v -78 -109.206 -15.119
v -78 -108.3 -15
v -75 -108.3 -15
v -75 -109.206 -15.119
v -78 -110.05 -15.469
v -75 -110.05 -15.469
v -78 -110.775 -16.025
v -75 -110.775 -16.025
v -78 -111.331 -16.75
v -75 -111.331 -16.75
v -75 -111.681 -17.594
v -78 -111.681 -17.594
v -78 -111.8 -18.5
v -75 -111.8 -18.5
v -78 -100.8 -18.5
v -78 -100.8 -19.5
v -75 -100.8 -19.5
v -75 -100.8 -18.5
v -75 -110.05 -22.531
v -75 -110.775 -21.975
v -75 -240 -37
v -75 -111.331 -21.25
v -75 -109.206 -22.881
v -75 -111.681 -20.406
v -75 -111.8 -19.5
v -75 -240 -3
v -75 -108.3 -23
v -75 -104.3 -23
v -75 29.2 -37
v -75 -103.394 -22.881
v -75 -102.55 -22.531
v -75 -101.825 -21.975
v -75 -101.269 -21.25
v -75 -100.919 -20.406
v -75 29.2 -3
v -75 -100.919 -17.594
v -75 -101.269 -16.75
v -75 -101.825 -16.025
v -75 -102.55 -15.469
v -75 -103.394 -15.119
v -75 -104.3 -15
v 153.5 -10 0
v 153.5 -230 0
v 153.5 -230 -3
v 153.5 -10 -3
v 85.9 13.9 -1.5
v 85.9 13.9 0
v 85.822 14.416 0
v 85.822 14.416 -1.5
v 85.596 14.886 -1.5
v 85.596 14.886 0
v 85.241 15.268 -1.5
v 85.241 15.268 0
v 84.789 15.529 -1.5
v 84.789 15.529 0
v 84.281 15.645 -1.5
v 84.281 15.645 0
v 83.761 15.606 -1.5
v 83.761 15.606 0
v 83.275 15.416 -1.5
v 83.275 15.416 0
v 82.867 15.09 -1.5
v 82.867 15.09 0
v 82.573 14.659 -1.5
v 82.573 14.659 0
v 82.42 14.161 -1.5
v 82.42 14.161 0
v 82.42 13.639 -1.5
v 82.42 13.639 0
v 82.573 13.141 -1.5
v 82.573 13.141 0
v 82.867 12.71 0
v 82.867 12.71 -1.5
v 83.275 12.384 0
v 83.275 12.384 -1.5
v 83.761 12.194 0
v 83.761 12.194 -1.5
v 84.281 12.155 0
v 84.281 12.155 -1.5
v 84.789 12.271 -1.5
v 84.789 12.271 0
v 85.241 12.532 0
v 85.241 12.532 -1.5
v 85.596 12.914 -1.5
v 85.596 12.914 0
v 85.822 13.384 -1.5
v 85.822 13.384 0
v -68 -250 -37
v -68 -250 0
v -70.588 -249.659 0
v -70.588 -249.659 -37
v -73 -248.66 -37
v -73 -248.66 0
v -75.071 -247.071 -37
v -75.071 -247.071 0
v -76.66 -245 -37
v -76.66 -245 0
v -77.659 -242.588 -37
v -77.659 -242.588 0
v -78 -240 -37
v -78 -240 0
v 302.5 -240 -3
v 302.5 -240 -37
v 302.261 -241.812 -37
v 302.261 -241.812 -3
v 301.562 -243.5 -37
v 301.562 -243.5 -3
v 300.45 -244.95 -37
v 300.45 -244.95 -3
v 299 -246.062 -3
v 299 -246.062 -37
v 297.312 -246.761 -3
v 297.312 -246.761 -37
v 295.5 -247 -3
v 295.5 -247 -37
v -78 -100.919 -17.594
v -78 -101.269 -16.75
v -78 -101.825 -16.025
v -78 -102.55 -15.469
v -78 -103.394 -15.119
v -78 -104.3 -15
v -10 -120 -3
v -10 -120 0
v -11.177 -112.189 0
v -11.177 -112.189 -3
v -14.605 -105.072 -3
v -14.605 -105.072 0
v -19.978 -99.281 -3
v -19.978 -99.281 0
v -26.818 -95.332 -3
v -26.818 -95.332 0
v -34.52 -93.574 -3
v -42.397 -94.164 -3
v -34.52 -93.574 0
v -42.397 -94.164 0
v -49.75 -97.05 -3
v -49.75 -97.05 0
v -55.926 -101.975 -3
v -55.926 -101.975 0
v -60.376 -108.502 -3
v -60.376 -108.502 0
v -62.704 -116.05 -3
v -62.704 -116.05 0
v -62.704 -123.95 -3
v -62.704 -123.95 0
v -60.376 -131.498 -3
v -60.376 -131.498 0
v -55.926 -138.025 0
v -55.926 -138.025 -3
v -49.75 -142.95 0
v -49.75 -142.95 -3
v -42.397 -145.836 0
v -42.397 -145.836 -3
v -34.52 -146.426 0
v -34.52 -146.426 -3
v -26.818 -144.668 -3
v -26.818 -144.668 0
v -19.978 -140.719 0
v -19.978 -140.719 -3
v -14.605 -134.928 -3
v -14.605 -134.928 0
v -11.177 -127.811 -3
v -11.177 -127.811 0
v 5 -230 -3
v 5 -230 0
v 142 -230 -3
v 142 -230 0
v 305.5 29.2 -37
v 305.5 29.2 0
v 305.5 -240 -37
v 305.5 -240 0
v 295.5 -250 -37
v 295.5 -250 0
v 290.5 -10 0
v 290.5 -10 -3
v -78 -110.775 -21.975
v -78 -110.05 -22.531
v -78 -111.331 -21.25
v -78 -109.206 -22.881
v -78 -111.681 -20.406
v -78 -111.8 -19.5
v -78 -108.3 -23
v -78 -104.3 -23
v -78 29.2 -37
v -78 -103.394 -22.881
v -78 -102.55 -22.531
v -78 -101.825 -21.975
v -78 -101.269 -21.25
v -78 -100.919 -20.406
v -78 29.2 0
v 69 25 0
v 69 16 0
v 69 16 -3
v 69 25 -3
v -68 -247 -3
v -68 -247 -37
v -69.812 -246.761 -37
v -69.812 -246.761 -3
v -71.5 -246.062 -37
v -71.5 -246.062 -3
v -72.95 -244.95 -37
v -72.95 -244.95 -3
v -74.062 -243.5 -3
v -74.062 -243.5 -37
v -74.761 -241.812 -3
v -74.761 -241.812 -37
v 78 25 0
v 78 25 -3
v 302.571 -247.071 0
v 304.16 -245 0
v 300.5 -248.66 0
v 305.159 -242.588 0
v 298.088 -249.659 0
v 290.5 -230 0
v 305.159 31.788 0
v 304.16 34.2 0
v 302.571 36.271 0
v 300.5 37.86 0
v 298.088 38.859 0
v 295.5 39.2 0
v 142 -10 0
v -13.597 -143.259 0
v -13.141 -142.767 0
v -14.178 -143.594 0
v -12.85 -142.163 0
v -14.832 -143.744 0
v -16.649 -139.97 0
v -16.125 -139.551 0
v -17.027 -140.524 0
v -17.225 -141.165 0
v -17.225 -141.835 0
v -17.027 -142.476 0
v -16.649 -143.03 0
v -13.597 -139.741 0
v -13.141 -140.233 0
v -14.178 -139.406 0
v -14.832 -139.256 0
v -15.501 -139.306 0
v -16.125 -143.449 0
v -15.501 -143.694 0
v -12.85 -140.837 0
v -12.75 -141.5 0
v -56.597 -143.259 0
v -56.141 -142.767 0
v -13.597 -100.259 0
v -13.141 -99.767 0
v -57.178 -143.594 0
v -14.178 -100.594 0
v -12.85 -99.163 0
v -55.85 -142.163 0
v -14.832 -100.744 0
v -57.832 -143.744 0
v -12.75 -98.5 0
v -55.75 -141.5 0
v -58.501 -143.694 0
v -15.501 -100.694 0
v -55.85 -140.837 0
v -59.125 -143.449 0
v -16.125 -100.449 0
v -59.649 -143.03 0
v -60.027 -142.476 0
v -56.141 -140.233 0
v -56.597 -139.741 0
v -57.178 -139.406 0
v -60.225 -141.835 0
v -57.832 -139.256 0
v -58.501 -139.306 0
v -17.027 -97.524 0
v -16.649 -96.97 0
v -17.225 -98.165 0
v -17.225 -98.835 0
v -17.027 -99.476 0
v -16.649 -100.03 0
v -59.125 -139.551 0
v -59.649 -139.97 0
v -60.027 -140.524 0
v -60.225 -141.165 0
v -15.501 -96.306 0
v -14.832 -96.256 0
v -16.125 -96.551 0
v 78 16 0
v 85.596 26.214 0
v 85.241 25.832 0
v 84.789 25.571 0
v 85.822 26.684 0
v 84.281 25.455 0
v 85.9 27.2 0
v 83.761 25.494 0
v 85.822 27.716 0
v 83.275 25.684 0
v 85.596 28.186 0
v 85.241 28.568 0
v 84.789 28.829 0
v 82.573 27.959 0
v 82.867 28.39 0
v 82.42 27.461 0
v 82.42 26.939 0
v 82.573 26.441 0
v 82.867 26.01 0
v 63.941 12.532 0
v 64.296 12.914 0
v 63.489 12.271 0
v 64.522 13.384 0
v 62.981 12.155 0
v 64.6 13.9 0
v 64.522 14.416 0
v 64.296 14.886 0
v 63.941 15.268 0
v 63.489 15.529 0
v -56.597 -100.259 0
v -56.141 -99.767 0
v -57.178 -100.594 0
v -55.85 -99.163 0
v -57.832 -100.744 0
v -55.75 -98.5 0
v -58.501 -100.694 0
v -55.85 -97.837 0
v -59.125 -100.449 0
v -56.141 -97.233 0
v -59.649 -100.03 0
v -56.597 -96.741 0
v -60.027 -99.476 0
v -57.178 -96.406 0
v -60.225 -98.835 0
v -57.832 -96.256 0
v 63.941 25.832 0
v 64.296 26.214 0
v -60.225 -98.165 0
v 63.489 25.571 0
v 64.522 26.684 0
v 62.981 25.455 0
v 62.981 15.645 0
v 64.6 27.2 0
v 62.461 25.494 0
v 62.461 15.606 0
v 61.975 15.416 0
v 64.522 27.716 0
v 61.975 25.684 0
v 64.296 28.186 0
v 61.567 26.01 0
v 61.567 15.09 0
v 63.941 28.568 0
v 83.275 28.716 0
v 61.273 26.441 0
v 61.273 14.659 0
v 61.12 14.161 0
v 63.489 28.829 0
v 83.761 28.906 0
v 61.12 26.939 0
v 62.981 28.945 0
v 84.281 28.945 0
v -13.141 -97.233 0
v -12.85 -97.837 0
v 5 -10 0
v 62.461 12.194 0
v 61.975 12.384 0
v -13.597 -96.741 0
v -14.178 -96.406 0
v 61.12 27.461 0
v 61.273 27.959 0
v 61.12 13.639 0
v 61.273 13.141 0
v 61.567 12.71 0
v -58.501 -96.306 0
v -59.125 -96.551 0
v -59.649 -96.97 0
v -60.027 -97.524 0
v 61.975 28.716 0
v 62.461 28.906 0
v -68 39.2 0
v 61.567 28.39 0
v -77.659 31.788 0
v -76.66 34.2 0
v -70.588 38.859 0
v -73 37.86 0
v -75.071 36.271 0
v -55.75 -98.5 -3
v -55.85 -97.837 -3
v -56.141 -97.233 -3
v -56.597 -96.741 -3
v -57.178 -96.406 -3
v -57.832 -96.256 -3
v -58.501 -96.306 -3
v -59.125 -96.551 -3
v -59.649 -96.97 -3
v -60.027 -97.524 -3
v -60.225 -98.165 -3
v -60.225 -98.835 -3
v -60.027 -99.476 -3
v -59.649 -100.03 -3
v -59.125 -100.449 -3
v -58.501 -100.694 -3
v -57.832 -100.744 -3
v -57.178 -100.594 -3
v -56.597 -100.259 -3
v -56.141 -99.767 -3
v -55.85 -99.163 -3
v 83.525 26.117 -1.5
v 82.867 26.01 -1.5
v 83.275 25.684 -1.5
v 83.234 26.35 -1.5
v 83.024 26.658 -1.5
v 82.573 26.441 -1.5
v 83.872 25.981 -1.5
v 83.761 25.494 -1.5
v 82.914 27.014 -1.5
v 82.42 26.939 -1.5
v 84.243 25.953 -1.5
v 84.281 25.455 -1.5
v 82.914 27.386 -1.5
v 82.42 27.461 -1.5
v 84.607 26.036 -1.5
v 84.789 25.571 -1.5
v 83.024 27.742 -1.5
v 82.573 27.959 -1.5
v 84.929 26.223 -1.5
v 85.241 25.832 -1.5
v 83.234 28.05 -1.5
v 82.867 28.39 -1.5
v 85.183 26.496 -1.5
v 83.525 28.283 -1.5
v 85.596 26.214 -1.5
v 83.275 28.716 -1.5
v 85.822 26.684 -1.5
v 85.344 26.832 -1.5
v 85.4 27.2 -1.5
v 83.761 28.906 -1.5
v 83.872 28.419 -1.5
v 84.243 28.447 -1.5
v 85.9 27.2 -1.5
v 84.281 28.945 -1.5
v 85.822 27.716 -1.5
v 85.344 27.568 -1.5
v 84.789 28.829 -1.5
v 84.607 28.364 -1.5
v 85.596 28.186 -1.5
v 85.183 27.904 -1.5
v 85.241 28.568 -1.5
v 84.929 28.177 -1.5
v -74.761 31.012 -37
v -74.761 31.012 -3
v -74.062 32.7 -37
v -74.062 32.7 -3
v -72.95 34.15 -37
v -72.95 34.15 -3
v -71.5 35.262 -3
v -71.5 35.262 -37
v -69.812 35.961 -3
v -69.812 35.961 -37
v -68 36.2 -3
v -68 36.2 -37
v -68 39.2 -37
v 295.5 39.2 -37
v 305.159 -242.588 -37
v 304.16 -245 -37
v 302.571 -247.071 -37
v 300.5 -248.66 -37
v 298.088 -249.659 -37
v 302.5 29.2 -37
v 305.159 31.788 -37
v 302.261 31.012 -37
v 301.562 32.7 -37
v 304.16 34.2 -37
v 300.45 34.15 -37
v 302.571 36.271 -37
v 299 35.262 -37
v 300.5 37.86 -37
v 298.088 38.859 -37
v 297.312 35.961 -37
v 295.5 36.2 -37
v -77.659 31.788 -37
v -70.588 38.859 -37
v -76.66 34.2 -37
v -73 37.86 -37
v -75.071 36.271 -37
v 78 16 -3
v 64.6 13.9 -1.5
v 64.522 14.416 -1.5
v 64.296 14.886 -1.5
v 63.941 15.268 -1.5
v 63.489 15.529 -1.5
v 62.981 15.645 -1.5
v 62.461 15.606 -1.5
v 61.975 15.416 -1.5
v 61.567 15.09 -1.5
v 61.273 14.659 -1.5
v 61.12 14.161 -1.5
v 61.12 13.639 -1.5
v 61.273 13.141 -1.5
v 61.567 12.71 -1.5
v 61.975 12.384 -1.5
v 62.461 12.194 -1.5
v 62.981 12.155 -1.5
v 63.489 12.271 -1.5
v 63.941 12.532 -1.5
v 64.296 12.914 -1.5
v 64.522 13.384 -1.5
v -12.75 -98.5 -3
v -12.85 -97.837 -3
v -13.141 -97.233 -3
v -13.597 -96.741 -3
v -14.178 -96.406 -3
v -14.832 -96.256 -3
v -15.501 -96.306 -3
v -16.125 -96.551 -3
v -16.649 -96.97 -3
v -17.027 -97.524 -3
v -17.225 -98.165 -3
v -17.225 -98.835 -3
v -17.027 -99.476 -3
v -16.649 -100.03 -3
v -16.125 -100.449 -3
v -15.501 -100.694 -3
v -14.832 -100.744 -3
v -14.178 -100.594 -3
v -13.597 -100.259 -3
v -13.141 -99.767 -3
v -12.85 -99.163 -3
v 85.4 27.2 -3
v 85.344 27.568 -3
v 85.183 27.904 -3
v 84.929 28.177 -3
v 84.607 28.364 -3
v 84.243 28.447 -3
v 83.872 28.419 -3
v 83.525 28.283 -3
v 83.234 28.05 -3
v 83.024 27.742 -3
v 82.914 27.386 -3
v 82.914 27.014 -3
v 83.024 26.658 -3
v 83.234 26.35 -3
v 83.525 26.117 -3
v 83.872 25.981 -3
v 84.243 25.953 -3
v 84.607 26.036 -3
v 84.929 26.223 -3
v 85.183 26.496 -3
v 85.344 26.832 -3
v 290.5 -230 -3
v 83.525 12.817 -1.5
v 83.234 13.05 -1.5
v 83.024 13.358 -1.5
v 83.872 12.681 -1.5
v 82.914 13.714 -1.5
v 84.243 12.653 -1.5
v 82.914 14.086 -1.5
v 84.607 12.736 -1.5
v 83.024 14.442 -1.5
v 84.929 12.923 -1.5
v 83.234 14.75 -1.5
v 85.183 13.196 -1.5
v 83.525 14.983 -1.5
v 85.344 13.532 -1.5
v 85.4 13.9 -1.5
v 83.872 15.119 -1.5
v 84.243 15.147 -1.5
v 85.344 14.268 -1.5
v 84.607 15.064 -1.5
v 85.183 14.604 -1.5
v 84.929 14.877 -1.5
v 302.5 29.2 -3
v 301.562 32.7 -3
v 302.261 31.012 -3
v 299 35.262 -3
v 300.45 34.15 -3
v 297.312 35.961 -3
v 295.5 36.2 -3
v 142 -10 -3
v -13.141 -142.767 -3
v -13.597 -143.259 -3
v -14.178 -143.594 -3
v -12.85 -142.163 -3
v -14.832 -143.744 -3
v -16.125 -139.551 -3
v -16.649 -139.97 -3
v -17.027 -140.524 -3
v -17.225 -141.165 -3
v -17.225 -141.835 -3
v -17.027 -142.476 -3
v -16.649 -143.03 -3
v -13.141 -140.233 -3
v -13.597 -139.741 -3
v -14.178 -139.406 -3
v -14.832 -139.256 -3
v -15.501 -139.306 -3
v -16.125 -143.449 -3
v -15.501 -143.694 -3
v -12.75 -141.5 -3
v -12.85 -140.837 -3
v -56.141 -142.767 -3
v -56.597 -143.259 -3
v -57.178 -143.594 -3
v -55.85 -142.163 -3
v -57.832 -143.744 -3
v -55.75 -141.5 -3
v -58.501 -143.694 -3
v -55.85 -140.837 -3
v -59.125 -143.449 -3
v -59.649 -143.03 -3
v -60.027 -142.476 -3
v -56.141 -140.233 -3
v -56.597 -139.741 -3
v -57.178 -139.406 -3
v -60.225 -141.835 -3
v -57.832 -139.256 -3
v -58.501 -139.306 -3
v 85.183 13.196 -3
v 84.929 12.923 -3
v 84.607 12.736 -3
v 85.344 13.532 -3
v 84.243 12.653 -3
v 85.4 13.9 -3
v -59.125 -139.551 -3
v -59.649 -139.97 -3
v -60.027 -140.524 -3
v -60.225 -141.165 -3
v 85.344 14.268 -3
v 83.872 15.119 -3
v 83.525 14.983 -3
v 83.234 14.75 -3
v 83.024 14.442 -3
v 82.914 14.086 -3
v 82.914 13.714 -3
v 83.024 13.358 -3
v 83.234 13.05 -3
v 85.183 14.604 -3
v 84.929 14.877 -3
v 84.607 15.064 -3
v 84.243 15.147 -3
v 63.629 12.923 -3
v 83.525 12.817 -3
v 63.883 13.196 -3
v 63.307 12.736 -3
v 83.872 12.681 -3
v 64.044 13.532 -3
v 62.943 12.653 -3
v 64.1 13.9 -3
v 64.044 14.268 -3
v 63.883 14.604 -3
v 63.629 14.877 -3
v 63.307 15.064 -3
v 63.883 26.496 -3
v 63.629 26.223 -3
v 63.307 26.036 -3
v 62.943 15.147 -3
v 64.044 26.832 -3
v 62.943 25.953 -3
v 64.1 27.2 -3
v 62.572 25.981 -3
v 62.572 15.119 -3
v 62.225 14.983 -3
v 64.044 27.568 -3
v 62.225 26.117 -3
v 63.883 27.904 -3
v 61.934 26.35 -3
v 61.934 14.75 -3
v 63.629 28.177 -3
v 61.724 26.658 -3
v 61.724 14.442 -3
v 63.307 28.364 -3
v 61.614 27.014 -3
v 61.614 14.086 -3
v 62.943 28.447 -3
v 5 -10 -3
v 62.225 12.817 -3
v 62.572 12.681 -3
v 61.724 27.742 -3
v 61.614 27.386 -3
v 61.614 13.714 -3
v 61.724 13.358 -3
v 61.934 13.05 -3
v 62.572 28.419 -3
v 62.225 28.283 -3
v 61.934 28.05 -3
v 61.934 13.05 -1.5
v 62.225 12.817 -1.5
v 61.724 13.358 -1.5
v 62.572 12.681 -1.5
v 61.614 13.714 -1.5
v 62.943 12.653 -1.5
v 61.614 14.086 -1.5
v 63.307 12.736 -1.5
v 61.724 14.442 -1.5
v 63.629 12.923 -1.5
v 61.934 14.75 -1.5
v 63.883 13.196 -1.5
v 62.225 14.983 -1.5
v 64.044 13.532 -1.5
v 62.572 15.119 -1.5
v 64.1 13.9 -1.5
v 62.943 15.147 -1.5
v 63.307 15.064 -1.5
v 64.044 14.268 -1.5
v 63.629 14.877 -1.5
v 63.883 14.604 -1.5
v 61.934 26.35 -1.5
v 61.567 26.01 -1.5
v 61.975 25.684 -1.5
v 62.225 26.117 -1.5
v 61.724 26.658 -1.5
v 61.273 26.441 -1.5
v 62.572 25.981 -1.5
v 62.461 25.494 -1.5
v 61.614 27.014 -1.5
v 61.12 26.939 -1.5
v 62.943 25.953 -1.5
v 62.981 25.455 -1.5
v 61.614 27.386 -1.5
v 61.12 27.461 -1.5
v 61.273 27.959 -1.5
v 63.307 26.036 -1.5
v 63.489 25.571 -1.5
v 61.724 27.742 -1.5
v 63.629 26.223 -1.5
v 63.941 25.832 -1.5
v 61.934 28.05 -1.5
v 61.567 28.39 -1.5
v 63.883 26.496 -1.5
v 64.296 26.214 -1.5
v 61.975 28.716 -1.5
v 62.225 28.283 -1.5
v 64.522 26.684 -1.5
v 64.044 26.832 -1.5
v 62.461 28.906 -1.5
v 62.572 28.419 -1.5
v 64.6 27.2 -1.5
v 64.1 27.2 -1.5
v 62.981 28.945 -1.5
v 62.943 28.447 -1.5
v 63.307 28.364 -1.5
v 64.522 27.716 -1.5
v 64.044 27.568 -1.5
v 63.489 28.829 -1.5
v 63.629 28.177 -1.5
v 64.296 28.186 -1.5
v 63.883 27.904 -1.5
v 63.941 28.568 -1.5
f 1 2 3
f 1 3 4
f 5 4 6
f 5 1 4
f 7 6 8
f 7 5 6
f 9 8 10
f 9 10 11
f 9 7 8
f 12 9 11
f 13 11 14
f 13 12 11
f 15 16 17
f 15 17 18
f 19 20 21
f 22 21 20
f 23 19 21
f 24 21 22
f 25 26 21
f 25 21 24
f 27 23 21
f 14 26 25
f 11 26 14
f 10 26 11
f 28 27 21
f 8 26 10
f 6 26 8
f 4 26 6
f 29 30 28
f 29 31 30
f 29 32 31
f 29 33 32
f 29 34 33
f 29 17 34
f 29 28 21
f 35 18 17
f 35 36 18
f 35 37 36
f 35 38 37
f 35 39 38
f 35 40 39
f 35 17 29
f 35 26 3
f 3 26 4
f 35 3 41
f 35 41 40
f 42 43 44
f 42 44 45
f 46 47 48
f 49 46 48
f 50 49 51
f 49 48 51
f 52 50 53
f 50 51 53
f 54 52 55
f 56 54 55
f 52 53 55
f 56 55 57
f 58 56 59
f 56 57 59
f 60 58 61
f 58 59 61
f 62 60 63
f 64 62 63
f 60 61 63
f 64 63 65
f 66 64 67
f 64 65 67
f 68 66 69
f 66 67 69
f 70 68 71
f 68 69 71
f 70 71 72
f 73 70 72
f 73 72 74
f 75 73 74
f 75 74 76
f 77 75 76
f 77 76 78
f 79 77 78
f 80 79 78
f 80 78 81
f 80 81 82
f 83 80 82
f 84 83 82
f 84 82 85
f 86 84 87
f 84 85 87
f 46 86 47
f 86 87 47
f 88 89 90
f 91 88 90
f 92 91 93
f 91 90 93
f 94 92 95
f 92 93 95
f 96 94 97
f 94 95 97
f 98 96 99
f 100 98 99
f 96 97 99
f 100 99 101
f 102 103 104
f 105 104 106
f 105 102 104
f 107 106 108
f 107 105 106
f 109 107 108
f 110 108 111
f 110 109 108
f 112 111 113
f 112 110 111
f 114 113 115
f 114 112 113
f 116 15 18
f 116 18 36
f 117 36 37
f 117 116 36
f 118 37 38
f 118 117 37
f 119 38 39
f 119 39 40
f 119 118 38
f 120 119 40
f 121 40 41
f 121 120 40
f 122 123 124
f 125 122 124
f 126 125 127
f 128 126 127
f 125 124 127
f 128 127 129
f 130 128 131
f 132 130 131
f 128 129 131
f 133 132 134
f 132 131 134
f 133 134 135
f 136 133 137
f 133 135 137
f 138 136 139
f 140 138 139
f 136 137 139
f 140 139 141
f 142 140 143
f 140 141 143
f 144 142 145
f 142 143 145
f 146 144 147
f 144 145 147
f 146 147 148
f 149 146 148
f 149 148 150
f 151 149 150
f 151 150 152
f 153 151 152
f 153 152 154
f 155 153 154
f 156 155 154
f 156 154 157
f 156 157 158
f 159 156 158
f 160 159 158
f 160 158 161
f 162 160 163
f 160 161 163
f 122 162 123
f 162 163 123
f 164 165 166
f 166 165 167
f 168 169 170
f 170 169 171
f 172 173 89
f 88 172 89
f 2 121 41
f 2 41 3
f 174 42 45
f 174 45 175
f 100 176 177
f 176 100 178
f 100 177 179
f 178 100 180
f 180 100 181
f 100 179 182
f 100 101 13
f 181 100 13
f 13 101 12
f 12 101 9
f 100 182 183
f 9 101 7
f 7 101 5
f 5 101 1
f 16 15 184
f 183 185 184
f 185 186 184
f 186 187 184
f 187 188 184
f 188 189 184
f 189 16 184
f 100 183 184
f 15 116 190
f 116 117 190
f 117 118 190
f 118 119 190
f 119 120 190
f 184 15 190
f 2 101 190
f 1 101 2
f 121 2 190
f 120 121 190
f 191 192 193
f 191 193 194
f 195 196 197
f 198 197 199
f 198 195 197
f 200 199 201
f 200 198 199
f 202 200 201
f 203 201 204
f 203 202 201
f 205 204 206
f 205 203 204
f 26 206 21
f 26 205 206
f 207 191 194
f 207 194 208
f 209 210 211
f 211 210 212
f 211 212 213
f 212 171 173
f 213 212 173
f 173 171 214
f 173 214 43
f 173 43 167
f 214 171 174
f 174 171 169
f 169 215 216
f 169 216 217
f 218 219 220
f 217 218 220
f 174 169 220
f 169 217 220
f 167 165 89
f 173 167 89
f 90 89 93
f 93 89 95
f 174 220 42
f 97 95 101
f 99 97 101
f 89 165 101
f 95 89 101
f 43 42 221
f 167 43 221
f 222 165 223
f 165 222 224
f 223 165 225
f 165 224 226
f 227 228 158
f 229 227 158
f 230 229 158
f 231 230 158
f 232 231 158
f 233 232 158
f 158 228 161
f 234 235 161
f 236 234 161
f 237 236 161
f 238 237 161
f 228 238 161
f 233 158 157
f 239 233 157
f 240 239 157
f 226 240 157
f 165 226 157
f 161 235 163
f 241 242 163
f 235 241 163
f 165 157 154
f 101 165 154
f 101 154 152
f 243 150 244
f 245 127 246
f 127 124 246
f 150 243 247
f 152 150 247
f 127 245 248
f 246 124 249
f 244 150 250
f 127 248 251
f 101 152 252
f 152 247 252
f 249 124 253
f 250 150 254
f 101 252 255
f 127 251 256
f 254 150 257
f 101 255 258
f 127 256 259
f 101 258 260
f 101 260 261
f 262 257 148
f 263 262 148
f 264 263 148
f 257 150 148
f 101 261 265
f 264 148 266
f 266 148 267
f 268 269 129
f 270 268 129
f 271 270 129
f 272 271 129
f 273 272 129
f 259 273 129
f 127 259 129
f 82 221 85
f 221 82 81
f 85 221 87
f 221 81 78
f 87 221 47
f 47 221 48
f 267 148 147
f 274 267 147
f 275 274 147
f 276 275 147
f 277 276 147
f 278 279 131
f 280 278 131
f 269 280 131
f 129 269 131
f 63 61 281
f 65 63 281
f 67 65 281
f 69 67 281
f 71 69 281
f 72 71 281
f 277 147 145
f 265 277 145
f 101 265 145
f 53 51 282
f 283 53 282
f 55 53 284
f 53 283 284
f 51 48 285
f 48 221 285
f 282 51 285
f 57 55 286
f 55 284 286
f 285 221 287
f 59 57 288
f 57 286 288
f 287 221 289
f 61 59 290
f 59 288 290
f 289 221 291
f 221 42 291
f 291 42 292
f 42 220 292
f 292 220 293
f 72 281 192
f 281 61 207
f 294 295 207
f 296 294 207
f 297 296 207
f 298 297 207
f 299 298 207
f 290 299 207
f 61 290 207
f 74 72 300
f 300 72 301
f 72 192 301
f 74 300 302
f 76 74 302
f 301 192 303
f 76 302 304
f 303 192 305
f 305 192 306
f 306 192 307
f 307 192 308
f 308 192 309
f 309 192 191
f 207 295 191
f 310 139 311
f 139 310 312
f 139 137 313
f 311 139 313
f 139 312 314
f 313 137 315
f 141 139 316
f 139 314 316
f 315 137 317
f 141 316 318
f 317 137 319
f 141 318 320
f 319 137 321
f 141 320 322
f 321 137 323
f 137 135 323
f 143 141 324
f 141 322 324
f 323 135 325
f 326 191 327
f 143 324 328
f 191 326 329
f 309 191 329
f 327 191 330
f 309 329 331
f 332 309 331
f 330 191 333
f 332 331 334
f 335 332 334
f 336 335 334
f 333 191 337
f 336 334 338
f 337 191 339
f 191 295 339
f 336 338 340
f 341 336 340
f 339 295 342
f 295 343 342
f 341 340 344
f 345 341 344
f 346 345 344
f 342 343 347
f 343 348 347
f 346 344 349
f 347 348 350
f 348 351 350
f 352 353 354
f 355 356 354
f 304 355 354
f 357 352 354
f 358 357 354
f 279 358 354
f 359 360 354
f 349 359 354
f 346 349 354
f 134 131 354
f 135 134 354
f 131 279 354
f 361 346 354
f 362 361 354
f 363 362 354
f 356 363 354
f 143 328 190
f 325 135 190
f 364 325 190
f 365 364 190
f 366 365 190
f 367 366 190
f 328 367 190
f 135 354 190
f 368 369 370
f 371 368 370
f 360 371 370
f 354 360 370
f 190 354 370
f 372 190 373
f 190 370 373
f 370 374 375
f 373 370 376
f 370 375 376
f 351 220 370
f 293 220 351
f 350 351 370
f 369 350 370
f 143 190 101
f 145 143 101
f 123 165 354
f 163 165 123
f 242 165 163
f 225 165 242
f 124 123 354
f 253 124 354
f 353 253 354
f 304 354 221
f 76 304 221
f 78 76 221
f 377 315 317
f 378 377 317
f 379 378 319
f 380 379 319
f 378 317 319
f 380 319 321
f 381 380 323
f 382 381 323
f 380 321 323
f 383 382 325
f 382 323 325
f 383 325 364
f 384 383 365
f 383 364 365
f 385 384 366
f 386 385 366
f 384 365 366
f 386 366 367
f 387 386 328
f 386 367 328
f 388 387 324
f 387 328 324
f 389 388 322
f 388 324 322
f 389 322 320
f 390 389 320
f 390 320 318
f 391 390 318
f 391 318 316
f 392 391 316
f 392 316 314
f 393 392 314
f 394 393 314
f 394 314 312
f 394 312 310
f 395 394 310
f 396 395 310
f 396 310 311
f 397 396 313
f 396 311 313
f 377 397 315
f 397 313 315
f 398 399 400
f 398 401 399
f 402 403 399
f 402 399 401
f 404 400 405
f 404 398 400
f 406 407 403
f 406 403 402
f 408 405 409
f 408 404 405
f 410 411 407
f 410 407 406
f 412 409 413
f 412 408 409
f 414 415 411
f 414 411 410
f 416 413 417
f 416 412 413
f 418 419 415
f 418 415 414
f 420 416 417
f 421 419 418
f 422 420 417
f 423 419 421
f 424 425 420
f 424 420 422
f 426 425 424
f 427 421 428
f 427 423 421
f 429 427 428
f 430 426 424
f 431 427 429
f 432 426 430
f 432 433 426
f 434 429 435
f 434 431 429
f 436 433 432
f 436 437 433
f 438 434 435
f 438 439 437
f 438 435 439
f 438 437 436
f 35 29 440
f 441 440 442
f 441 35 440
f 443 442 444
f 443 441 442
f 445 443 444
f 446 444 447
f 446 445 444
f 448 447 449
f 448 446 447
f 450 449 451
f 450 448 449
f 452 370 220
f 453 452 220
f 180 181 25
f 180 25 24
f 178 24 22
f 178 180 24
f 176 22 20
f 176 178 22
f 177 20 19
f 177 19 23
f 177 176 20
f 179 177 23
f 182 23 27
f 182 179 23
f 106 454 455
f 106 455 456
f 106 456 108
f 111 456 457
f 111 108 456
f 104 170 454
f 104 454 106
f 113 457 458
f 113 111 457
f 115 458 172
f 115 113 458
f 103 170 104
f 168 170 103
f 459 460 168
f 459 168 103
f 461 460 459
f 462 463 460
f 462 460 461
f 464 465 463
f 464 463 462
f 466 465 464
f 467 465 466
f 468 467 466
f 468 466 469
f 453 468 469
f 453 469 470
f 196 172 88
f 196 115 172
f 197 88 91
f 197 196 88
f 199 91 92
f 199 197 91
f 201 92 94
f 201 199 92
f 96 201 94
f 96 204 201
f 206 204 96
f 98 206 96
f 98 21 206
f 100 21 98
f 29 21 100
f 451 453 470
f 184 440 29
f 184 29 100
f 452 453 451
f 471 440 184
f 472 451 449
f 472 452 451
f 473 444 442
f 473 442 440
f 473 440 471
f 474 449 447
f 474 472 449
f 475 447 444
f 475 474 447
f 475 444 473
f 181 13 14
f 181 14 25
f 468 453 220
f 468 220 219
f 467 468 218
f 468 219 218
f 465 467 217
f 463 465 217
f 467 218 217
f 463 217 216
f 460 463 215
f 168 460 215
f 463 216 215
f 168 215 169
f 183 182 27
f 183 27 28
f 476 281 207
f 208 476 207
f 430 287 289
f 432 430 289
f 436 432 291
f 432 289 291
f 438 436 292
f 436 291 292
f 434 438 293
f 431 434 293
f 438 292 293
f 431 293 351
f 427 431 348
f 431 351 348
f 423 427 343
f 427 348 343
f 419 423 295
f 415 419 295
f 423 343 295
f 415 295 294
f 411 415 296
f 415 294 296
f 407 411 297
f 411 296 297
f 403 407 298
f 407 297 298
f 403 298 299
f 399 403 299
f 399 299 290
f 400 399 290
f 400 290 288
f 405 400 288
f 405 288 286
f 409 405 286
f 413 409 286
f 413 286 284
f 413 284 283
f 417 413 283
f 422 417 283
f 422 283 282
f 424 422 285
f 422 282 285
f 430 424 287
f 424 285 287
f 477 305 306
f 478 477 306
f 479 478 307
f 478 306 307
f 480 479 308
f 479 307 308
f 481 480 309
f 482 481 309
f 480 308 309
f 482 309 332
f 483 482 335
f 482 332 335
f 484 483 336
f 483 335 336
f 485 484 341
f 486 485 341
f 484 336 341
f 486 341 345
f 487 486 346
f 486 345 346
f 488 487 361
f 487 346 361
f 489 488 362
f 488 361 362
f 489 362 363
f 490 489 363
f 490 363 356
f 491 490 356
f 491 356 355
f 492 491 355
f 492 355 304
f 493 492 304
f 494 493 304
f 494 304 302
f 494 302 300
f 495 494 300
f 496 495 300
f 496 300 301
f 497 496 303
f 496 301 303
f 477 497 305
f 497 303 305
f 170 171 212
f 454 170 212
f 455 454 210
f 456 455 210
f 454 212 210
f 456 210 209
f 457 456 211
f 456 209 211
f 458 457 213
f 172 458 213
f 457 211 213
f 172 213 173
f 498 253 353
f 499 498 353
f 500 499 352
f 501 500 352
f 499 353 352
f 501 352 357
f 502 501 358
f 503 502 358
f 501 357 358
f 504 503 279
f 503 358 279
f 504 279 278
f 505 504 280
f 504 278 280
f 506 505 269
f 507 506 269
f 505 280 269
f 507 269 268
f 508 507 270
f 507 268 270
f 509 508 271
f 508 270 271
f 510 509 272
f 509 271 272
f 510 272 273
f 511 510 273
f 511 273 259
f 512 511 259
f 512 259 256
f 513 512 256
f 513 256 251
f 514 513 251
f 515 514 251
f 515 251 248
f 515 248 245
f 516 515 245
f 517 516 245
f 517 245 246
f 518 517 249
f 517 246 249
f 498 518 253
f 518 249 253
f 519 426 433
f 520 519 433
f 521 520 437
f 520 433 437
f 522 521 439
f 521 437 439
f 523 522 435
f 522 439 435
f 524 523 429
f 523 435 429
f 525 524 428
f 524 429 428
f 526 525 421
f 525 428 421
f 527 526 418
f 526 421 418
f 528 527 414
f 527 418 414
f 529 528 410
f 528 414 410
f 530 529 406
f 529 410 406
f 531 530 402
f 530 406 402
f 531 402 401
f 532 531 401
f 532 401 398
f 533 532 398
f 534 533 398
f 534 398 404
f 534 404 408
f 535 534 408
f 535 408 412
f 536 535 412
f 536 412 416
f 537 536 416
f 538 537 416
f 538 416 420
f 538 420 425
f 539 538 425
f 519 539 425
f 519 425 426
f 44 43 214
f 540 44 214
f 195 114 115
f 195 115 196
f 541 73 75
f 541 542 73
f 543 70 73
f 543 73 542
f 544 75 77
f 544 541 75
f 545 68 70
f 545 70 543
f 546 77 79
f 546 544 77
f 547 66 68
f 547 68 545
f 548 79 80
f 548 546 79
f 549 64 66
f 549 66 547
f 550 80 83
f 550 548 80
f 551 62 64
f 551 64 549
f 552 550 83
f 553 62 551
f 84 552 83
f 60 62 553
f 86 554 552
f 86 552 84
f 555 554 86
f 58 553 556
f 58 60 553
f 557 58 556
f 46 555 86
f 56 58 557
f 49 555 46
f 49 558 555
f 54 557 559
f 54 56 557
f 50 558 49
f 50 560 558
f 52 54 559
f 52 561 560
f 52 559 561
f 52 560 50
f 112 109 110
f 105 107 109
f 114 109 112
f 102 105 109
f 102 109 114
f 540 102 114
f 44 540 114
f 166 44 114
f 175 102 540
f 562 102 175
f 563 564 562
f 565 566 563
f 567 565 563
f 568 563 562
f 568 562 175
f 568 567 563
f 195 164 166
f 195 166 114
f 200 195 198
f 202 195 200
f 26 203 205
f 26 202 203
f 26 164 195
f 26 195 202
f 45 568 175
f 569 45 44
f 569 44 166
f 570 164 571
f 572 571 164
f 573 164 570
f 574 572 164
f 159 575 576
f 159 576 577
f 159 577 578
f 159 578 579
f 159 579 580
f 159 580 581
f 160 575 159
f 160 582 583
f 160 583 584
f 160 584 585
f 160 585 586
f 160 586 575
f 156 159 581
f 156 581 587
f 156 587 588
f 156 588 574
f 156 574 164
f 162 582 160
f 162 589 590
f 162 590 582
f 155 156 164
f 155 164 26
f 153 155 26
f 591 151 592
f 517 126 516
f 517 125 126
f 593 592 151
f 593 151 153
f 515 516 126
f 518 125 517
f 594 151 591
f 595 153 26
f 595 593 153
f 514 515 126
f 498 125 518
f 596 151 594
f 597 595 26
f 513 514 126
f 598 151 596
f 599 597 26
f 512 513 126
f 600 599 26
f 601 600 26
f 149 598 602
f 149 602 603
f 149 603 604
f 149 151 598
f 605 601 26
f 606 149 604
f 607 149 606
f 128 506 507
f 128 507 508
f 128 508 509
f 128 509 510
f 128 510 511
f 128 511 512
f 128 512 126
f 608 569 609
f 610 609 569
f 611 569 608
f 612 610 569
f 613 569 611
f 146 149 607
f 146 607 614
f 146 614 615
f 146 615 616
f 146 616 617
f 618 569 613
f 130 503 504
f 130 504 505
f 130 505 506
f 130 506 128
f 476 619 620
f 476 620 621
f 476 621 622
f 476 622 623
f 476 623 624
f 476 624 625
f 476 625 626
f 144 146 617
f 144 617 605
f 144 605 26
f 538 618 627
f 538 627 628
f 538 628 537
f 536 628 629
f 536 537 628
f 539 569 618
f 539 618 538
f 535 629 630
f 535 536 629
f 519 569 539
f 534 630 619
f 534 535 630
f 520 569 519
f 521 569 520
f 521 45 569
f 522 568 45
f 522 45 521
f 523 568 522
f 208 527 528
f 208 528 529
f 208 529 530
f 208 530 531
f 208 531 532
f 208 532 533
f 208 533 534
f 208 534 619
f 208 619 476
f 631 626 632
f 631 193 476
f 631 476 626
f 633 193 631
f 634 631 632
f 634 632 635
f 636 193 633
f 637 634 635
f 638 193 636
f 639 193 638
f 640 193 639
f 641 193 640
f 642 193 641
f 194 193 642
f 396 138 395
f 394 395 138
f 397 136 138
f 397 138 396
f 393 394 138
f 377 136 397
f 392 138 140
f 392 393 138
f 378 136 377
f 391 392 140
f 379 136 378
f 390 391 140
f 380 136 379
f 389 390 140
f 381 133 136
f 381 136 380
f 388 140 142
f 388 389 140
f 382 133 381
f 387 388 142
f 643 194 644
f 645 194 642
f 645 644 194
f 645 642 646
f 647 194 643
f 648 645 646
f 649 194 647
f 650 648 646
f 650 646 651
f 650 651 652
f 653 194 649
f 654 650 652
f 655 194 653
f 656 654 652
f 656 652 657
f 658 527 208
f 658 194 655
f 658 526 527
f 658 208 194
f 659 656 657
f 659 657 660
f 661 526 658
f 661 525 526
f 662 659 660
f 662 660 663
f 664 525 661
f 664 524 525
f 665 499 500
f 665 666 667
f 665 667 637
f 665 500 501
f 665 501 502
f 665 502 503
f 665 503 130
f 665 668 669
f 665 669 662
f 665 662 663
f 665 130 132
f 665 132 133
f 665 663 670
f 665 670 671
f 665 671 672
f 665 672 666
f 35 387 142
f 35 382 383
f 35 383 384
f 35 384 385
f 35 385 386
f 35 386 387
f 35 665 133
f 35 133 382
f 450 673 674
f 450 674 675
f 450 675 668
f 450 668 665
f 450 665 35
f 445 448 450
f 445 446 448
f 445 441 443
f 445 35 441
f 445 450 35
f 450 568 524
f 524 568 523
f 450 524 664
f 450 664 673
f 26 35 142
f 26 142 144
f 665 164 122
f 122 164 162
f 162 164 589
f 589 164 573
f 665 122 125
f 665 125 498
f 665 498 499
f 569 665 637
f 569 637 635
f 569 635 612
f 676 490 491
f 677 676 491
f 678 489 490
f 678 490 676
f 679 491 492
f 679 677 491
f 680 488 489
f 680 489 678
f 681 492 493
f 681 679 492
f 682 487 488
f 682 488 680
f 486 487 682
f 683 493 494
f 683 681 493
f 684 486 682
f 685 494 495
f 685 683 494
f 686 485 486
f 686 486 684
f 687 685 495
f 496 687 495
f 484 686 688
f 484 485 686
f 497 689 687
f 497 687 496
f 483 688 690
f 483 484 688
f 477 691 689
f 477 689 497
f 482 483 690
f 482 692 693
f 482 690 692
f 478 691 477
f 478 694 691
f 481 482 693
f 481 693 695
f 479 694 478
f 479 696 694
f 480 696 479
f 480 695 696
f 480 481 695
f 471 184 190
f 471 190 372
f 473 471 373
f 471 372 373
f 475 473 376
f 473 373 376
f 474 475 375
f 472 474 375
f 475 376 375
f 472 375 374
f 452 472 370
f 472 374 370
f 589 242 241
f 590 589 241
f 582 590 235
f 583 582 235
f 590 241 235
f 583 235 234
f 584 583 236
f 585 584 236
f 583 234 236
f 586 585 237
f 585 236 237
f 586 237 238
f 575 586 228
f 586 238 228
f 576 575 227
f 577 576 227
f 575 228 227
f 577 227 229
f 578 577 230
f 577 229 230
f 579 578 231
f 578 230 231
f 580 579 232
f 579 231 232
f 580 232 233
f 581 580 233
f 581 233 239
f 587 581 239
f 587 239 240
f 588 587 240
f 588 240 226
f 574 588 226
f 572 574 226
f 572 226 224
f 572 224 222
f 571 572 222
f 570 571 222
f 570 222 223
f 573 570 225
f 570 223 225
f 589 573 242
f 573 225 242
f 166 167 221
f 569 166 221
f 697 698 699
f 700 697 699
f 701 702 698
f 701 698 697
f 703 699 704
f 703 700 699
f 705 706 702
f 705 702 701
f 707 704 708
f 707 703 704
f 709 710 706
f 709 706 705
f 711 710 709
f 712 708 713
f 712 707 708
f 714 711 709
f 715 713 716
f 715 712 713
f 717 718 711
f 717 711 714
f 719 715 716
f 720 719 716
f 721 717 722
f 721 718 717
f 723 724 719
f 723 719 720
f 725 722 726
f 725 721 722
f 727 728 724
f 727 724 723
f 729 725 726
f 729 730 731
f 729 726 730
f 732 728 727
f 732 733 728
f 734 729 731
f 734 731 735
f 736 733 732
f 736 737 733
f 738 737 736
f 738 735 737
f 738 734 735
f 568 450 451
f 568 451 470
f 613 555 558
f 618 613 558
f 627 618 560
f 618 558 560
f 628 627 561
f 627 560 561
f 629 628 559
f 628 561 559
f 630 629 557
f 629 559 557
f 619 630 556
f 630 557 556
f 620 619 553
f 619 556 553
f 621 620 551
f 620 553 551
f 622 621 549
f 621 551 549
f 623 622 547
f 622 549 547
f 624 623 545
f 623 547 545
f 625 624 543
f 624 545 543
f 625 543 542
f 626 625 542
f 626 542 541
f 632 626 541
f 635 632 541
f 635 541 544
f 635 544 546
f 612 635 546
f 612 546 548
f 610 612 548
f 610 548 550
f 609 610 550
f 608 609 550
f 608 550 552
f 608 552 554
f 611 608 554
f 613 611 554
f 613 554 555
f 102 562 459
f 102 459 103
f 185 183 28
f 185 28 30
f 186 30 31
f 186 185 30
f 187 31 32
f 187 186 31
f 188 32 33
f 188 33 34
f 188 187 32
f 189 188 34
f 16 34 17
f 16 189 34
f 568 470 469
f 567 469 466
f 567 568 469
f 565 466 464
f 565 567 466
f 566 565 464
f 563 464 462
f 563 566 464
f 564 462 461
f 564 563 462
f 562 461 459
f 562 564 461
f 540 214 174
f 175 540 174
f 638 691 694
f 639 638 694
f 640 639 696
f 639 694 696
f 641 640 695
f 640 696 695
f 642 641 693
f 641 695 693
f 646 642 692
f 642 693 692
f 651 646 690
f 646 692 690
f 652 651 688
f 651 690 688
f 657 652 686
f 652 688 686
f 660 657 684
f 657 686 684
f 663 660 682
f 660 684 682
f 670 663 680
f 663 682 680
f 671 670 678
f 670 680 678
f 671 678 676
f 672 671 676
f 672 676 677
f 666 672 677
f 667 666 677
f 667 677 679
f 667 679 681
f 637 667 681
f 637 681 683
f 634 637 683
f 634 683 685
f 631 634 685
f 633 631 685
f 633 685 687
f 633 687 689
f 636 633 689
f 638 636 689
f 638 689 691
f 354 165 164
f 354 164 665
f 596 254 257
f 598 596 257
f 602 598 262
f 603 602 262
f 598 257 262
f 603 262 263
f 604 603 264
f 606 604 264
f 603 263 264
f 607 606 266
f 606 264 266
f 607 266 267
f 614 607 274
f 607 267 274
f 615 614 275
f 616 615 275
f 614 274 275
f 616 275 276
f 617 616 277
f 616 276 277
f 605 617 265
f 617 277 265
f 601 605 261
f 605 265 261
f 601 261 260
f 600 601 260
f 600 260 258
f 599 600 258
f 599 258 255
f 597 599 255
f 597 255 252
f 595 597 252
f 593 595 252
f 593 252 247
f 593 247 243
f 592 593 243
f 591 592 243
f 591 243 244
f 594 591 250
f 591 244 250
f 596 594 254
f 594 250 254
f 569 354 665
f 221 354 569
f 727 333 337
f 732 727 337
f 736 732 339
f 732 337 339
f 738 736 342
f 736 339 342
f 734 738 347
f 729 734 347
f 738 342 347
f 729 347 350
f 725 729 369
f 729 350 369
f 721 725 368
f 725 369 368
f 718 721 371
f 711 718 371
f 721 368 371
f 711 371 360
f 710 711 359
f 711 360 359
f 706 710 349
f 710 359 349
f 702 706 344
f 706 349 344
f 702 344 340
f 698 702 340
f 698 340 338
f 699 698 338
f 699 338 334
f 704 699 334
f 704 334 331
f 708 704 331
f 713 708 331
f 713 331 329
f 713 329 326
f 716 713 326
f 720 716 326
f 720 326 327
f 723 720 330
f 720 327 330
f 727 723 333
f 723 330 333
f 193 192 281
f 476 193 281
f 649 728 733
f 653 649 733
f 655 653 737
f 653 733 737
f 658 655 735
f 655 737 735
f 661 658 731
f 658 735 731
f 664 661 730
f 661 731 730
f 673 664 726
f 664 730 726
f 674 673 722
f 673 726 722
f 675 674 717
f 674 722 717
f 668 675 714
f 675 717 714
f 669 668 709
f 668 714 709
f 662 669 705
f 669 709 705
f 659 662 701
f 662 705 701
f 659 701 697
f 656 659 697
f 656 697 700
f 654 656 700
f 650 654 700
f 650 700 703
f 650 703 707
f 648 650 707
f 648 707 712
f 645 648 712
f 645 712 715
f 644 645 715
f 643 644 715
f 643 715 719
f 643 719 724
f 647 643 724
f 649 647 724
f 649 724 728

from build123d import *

# Parameters (mm, degrees)
EXTRUDE_1_DEPTH      = 37
SHELL_4_T            = -3
SKETCH_1_8_R         = 2.25
SKETCH_1_8_R_2       = 26.5
SKETCH_1_8_R_3       = 1.25
SKETCH_1_8_W         = 137
SKETCH_1_8_H         = 220
SKETCH_1_8_W_2       = 9
SKETCH_1_8_H_2       = 9
CUT_EXTRUDE_8_DEPTH  = 3
SKETCH_1_9_R         = 1.75
CUT_EXTRUDE_9_DEPTH  = 1.5
CUT_EXTRUDE_10_DEPTH = 3


with BuildPart() as part:
    # 草图1 → 凸台-拉伸1 (new body)
    with BuildSketch(Plane.XY):
        with BuildLine():
            Line((-68, 39.2), (295.5, 39.2))
            ThreePointArc((295.5, 39.2), (302.571067812, 36.271067812), (305.5, 29.2))
            Line((305.5, 29.2), (305.5, -240))
            ThreePointArc((305.5, -240), (302.571067812, -247.071067812), (295.5, -250))
            Line((295.5, -250), (-68, -250))
            ThreePointArc((-68, -250), (-75.071067812, -247.071067812), (-78, -240))
            Line((-78, -240), (-78, 29.2))
            ThreePointArc((-78, 29.2), (-75.071067812, 36.271067812), (-68, 39.2))
        make_face()
    extrude(amount=-EXTRUDE_1_DEPTH)

    # 抽壳4
    shell_4_openings = [part.faces().sort_by_distance(p)[0] for p in [
        (113.75, -105.4, -37),
    ]]
    offset(amount=SHELL_4_T, openings=shell_4_openings, kind=Kind.INTERSECTION)

    # 草图1<8> → 切除-拉伸8 (cut)
    with BuildSketch(Plane.XY):
        with Locations((-58, -98.5)):
            Circle(SKETCH_1_8_R)
        with Locations((-36.5, -120)):
            Circle(SKETCH_1_8_R_2)
        with Locations((-15, -98.5)):
            Circle(SKETCH_1_8_R)
        with Locations((-15, -141.5)):
            Circle(SKETCH_1_8_R)
        with Locations((-58, -141.5)):
            Circle(SKETCH_1_8_R)
        with Locations((62.85, 27.2)):
            Circle(SKETCH_1_8_R_3)
        with Locations((84.15, 27.2)):
            Circle(SKETCH_1_8_R_3)
        with Locations((84.15, 13.9)):
            Circle(SKETCH_1_8_R_3)
        with Locations((62.85, 13.9)):
            Circle(SKETCH_1_8_R_3)
        with Locations((73.5, -120)):
            Rectangle(SKETCH_1_8_W, SKETCH_1_8_H)
        with Locations((222, -120)):
            Rectangle(SKETCH_1_8_W, SKETCH_1_8_H)
        with Locations((73.5, 20.5)):
            Rectangle(SKETCH_1_8_W_2, SKETCH_1_8_H_2)
    extrude(amount=-CUT_EXTRUDE_8_DEPTH, mode=Mode.SUBTRACT)

    # 草图1<9> → 切除-拉伸9 (cut)
    with BuildSketch(Plane.XY):
        with Locations((62.85, 27.2)):
            Circle(SKETCH_1_9_R)
        with Locations((84.15, 27.2)):
            Circle(SKETCH_1_9_R)
        with Locations((84.15, 13.9)):
            Circle(SKETCH_1_9_R)
        with Locations((62.85, 13.9)):
            Circle(SKETCH_1_9_R)
    extrude(amount=-CUT_EXTRUDE_9_DEPTH, mode=Mode.SUBTRACT)

    # 草图2 → 切除-拉伸10 (cut)
    with BuildSketch(Plane.ZY.offset(78)):
        with BuildLine():
            Line((-19.5, -100.8), (-18.5, -100.8))
            ThreePointArc((-18.5, -100.8), (-16.025126266, -101.825126266), (-15, -104.3))
            Line((-15, -104.3), (-15, -108.3))
            ThreePointArc((-15, -108.3), (-16.025126266, -110.774873734), (-18.5, -111.8))
            Line((-18.5, -111.8), (-19.5, -111.8))
            ThreePointArc((-19.5, -111.8), (-21.974873734, -110.774873734), (-23, -108.3))
            Line((-23, -108.3), (-23, -104.3))
            ThreePointArc((-23, -104.3), (-21.974873734, -101.825126266), (-19.5, -100.8))
        make_face()
    extrude(amount=-CUT_EXTRUDE_10_DEPTH, mode=Mode.SUBTRACT)


solid = part.part
